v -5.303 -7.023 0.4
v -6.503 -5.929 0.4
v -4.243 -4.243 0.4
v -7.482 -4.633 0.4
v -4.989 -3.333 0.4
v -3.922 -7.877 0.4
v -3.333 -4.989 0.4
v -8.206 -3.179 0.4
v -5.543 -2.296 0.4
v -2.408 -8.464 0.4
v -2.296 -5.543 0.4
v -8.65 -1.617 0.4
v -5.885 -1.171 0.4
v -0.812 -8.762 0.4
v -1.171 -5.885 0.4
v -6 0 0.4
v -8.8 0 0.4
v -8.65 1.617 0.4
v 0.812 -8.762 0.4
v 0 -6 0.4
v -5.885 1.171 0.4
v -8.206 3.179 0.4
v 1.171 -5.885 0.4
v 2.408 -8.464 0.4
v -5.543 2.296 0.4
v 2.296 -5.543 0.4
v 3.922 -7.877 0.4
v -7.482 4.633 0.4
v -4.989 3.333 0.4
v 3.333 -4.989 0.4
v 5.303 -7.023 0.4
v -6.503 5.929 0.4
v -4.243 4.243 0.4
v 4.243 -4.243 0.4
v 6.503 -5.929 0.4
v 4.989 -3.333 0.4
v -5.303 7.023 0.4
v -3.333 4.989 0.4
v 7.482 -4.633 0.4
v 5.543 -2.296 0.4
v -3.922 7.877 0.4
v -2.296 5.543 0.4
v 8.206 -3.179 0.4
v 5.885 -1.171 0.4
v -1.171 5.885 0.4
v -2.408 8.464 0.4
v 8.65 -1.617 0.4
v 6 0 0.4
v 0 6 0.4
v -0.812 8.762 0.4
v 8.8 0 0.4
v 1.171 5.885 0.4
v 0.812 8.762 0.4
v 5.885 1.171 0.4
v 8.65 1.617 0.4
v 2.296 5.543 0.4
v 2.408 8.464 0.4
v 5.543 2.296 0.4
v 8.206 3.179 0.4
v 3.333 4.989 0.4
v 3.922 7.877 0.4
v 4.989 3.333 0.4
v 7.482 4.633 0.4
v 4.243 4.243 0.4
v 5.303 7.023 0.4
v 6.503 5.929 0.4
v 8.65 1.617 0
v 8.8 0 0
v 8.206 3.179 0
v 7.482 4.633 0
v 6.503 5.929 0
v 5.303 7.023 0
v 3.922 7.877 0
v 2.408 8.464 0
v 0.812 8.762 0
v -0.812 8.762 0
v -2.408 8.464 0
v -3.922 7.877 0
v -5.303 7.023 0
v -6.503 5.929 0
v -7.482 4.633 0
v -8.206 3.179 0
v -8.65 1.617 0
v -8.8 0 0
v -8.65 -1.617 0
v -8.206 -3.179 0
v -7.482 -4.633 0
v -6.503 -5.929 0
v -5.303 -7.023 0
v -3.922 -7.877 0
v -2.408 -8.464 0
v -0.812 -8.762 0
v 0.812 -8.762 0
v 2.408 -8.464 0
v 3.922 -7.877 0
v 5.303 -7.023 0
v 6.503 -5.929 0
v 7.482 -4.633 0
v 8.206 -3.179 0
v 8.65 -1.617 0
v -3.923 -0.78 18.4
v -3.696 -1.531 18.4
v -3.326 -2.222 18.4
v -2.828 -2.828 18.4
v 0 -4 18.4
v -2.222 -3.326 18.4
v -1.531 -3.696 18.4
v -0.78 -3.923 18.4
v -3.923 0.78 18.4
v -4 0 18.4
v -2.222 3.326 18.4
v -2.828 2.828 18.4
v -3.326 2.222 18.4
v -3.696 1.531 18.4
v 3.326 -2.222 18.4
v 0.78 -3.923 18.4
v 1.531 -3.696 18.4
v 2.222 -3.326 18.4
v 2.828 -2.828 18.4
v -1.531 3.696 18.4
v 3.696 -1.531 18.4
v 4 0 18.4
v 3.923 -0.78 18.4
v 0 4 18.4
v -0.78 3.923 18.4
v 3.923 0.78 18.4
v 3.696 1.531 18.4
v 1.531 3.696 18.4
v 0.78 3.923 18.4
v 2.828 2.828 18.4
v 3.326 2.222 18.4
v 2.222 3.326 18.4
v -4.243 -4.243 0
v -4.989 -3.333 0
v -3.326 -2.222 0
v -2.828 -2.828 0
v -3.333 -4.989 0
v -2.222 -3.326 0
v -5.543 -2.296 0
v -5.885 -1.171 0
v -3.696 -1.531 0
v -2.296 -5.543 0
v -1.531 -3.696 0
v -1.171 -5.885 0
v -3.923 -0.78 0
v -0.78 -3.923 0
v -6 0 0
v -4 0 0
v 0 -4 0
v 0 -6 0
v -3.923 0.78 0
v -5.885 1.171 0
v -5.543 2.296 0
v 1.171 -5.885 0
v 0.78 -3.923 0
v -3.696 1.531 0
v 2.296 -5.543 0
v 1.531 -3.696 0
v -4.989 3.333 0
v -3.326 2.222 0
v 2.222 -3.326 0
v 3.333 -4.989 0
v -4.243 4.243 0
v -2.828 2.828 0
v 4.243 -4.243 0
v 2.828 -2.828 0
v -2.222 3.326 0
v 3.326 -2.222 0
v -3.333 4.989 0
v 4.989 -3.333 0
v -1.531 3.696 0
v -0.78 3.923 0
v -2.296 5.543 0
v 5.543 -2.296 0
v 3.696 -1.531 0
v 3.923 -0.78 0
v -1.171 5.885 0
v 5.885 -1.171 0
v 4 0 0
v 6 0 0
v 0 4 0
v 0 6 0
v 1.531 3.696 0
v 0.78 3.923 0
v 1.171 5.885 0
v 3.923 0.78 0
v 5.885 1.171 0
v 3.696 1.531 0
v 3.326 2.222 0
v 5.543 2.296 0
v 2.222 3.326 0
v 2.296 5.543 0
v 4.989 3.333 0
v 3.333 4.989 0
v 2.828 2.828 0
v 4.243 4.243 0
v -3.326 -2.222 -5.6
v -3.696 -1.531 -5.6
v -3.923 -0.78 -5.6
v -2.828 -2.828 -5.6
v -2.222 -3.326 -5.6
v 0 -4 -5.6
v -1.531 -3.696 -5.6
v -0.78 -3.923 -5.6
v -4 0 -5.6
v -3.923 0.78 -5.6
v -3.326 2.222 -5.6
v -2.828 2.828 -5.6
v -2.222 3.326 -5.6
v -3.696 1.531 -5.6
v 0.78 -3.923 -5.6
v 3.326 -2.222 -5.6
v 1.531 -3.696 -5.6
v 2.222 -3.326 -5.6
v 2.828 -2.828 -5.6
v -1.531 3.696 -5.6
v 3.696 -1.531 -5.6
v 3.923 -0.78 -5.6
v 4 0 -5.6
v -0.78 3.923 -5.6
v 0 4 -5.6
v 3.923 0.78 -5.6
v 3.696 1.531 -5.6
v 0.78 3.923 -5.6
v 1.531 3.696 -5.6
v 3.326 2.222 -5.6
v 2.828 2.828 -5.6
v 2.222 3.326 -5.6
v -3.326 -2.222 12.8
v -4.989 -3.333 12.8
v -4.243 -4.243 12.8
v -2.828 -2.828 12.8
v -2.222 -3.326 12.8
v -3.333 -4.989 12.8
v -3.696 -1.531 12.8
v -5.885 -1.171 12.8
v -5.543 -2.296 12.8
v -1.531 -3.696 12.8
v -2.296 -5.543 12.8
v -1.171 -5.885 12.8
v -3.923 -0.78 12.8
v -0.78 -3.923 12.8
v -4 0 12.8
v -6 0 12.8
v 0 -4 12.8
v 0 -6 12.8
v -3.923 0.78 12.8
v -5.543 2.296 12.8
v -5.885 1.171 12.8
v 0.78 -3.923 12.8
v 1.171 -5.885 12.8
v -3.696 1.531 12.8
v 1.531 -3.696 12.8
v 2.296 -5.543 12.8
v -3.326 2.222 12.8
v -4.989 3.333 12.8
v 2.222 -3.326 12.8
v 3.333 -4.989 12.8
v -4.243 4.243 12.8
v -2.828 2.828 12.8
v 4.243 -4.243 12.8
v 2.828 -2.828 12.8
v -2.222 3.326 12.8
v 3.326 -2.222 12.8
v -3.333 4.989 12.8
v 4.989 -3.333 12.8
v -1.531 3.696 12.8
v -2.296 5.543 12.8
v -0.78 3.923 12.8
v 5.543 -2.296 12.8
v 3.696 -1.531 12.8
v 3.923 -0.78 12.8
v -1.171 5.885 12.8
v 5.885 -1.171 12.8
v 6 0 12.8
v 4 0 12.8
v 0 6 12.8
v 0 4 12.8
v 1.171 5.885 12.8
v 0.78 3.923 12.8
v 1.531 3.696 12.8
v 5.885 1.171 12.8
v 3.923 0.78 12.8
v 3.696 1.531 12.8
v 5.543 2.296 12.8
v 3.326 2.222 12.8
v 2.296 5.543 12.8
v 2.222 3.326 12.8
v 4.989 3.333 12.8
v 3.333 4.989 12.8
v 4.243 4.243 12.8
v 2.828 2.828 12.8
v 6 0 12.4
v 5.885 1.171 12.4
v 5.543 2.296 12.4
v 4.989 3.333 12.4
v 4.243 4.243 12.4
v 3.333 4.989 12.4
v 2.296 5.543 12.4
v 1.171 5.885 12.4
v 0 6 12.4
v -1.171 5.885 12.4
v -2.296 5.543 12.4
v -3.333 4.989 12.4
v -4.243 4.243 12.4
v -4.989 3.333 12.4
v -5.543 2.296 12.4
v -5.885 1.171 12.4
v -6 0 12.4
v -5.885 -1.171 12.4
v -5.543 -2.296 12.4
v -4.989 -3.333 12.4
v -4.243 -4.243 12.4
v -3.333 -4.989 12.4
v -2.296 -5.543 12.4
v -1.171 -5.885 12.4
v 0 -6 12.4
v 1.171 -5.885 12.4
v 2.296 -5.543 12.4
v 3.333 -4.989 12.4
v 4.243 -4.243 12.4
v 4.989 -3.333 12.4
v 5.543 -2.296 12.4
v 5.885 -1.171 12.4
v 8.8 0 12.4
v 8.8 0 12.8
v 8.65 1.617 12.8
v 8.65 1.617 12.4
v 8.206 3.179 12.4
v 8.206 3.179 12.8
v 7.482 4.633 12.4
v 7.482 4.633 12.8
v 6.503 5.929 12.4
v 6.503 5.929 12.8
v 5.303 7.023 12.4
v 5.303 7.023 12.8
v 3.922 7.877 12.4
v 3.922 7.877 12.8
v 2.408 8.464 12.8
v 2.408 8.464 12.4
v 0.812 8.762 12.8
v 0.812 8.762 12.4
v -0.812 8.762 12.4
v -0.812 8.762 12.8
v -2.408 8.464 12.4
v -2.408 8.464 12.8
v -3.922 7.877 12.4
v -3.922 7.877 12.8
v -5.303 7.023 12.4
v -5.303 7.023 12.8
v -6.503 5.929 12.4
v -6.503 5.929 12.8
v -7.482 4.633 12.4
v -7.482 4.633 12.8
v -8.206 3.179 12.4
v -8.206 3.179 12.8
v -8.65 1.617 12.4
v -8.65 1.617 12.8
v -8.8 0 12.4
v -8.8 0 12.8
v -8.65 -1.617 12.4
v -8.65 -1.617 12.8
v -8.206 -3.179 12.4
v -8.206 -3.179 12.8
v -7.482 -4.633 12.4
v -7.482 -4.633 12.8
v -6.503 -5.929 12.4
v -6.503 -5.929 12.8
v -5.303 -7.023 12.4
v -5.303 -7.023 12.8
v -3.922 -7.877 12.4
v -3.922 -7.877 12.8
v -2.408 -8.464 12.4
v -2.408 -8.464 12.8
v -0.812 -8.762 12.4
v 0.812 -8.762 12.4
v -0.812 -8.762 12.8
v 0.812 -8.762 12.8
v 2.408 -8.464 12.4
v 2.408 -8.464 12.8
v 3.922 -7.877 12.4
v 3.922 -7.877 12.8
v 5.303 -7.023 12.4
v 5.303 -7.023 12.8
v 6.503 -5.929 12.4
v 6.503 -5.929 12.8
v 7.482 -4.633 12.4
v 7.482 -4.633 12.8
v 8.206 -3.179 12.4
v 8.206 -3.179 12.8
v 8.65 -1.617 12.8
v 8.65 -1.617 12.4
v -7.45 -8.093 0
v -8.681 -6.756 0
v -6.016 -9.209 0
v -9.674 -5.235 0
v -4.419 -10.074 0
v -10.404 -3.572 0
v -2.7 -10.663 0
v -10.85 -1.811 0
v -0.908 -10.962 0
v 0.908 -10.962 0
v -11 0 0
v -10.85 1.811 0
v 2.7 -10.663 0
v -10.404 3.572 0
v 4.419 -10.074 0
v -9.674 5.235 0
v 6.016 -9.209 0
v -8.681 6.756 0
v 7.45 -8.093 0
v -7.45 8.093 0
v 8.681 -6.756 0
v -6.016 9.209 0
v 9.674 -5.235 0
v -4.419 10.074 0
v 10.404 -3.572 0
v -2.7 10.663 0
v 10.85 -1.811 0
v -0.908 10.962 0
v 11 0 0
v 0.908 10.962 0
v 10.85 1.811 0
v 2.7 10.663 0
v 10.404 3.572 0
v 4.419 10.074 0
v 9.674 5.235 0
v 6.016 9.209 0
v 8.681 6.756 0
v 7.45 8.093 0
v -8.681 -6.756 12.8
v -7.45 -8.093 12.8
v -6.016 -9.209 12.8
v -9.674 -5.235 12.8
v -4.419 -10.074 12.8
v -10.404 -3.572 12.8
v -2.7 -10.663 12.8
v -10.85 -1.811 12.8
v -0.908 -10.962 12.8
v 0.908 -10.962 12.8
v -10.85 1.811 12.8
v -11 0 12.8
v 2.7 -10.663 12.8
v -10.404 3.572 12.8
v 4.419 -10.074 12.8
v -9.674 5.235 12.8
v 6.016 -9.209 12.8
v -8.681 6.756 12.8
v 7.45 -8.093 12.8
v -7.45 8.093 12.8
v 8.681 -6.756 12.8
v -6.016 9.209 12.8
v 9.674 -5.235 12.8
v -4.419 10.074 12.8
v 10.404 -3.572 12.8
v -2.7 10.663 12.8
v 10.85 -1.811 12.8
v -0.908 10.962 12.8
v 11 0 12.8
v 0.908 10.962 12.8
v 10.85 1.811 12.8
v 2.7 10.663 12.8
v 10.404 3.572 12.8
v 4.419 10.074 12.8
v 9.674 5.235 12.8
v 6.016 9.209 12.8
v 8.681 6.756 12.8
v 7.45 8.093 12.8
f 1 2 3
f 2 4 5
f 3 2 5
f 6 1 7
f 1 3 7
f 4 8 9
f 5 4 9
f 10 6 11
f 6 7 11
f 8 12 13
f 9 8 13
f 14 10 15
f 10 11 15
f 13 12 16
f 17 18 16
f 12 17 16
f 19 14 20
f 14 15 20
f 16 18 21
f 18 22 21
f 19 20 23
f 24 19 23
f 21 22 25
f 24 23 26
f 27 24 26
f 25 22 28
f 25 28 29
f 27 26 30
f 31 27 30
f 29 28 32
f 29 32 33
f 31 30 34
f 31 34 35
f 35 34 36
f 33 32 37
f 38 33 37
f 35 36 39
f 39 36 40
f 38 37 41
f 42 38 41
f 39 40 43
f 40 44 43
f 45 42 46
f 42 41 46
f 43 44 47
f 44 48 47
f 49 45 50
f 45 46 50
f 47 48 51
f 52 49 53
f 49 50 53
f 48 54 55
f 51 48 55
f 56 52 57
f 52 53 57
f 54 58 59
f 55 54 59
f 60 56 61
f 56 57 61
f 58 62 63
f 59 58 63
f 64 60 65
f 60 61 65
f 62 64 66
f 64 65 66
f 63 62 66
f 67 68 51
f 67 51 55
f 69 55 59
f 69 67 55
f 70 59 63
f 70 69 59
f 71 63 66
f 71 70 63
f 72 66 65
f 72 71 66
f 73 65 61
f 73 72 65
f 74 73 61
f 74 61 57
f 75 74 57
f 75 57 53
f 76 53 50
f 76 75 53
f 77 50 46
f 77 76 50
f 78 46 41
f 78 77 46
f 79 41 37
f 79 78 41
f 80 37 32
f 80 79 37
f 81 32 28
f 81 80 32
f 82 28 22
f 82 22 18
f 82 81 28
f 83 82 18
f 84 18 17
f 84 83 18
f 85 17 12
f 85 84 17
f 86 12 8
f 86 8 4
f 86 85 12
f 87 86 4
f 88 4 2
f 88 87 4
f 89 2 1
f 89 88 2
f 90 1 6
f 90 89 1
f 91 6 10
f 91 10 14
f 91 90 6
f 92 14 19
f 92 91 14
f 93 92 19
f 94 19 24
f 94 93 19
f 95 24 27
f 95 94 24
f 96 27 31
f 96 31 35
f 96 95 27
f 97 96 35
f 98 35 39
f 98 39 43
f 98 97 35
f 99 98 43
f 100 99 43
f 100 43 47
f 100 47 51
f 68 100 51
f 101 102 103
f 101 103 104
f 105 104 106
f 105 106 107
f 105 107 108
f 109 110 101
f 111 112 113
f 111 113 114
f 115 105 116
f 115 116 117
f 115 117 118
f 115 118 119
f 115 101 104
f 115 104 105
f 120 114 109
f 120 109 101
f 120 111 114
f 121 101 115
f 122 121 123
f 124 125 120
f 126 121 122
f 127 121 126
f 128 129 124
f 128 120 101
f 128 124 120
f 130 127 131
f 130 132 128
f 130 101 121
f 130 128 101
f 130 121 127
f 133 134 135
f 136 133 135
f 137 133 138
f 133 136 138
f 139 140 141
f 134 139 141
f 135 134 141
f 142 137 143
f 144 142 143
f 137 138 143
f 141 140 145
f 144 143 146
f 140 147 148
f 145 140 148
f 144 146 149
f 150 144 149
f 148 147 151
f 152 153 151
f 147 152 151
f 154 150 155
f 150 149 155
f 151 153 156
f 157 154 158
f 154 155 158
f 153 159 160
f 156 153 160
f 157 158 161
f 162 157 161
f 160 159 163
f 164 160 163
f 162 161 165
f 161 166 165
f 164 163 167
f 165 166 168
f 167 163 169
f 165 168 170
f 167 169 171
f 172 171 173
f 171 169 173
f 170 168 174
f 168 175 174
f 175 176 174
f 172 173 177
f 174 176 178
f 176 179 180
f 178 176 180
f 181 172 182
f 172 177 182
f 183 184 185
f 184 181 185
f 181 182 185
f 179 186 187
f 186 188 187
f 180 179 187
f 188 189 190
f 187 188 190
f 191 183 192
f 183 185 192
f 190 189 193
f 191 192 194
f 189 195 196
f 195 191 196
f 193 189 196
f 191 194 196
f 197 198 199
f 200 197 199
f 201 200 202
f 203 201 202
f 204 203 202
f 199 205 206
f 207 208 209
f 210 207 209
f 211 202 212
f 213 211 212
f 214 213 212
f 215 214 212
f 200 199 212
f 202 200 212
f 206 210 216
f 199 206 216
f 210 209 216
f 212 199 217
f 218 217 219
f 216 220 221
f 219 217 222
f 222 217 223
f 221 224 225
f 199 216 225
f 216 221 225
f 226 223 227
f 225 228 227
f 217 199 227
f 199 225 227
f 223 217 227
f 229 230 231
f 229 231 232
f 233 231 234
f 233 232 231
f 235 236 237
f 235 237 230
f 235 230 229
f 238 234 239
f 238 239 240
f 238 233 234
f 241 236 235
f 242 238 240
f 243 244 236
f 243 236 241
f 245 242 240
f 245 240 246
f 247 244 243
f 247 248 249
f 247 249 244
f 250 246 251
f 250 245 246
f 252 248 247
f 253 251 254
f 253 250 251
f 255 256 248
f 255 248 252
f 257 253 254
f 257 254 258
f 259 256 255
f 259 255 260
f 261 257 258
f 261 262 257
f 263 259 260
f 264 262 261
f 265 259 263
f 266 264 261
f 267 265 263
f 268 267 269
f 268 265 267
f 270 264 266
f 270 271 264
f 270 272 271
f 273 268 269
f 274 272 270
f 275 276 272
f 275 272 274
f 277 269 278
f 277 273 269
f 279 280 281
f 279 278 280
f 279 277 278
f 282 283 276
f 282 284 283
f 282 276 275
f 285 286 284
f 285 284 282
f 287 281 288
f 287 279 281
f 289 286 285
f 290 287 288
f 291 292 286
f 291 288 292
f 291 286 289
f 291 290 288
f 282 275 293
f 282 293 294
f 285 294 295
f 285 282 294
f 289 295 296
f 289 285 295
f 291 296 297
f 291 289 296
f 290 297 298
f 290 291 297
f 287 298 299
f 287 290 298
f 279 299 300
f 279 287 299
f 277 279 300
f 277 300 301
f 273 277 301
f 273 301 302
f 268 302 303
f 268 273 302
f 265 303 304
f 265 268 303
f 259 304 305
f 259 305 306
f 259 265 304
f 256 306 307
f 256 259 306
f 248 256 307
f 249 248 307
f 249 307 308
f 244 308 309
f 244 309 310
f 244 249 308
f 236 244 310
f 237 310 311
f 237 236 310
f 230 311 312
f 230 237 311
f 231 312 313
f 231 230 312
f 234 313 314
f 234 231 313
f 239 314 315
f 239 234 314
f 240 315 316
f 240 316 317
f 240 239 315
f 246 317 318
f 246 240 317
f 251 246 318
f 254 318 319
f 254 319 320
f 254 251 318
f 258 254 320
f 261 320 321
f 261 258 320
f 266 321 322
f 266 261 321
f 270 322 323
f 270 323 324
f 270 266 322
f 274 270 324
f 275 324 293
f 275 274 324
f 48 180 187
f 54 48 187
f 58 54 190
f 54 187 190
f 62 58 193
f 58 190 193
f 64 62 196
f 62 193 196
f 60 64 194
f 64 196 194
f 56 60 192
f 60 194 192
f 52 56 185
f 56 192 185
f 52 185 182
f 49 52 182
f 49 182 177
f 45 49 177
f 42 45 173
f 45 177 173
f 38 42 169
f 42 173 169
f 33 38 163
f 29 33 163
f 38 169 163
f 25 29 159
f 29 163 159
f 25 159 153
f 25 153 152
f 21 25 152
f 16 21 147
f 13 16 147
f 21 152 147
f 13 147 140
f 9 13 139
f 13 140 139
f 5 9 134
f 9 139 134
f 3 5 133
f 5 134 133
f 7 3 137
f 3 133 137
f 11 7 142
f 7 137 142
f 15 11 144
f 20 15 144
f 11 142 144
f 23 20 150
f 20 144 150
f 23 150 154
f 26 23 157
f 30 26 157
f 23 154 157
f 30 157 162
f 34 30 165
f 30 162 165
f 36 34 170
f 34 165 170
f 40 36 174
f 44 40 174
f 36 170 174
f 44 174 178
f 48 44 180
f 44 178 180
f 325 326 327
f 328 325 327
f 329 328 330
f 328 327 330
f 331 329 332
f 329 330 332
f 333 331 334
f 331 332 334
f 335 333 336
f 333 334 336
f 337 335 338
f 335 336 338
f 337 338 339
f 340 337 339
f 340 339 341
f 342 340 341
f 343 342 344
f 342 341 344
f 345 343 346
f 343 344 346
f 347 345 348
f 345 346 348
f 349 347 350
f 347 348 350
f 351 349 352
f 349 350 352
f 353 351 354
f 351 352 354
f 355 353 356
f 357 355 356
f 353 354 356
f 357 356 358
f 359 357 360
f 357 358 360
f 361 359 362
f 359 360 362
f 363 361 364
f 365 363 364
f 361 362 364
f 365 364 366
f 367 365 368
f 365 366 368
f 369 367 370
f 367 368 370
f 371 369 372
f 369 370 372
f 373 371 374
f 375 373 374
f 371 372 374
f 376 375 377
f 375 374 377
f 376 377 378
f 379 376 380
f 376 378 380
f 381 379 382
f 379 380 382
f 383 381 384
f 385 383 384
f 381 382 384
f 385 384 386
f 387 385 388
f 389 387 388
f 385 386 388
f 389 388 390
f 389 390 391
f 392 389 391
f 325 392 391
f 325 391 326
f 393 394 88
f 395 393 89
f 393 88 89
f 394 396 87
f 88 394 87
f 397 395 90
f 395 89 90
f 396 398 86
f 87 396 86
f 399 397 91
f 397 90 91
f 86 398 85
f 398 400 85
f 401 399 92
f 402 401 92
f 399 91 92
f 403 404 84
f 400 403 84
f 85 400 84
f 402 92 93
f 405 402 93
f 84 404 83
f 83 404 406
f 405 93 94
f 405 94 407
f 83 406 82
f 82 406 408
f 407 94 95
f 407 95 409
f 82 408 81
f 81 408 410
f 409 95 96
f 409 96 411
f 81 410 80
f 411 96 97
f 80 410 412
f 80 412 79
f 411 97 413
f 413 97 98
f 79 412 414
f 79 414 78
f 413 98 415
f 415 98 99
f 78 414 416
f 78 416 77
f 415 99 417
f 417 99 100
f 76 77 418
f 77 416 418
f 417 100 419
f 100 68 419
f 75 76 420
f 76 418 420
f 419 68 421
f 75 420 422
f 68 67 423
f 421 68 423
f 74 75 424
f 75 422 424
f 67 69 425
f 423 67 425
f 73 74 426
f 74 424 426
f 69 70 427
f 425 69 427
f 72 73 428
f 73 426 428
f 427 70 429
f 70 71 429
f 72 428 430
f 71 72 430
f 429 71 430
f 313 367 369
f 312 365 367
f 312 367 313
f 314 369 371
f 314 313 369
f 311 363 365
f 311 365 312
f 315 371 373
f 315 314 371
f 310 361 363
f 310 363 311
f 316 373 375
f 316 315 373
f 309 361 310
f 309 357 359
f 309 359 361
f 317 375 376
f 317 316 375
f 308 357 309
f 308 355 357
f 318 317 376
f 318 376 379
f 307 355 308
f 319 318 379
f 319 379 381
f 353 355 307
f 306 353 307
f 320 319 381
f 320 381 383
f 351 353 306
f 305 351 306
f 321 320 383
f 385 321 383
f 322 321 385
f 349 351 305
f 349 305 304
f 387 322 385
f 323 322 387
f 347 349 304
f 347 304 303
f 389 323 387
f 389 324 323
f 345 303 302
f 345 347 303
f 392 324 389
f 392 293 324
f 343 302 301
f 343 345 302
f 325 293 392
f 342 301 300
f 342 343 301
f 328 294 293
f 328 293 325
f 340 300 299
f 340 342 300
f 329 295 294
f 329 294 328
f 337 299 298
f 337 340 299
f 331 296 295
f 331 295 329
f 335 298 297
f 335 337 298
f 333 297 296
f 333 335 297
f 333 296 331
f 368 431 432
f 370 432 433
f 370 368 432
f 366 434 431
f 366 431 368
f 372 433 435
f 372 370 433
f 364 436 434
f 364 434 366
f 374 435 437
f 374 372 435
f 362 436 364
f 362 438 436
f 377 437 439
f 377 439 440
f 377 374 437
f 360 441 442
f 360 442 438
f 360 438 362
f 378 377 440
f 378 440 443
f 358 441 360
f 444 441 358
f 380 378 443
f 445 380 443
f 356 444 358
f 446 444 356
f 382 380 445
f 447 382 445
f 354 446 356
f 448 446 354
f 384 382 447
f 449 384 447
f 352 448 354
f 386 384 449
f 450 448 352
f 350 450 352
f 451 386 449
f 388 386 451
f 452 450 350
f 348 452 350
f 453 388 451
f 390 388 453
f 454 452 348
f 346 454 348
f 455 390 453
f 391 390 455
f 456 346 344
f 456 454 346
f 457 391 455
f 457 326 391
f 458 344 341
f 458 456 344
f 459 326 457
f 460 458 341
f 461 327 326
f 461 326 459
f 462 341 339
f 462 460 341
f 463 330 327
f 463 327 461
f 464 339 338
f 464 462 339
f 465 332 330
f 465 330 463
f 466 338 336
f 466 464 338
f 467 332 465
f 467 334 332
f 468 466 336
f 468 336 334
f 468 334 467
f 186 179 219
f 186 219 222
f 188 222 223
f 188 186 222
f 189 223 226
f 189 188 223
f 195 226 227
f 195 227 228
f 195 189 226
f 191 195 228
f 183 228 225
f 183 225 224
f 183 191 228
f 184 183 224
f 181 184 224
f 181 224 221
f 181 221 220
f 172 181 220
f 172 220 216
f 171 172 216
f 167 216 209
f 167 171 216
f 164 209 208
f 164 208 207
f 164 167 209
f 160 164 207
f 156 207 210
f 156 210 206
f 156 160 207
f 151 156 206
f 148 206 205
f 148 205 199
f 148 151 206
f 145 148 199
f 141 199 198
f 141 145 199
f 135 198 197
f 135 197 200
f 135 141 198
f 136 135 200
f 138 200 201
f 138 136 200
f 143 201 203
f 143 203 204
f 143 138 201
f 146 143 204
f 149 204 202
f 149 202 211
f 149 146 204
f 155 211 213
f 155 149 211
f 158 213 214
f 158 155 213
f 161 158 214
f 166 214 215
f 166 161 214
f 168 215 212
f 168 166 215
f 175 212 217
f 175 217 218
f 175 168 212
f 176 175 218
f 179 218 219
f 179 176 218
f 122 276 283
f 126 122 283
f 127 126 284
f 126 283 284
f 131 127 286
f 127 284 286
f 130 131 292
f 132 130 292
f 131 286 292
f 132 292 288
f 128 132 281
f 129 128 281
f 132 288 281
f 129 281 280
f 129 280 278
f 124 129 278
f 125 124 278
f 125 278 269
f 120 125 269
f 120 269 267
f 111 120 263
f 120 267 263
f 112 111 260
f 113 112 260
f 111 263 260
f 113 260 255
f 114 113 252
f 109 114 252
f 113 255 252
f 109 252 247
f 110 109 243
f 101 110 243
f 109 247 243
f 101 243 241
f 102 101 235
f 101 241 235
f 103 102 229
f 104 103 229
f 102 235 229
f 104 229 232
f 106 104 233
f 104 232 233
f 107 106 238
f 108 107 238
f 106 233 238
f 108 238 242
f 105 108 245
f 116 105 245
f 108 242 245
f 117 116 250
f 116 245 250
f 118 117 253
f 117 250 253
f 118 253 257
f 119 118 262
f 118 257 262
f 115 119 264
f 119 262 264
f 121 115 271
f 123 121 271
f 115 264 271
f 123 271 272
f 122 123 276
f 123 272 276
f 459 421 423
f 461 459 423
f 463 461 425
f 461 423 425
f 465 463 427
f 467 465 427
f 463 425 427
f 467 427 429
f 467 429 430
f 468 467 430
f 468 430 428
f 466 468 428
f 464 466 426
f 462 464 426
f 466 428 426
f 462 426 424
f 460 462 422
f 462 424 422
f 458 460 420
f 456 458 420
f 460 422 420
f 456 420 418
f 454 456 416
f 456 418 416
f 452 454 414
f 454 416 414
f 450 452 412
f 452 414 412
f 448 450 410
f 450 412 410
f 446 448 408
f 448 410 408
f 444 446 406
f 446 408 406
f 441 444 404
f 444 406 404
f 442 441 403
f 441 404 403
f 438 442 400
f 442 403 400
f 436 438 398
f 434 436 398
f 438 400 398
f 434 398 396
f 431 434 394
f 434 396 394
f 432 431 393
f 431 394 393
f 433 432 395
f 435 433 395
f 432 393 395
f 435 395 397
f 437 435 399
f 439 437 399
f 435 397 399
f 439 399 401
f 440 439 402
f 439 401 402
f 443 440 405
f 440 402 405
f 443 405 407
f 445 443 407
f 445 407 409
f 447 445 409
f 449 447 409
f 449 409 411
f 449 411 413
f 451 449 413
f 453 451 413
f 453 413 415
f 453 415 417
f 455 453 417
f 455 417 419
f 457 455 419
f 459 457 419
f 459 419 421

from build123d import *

# Parameters (mm, degrees)
CROQUIS1_R              = 11
SALIENTE_EXTRUIR1_DEPTH = 12.8
CROQUIS2_R              = 8.8
CROQUIS2_R_2            = 6
CORTAR_EXTRUIR1_DEPTH   = 0.4
CROQUIS3_R              = 4
SALIENTE_EXTRUIR2_DEPTH = 5.6


with BuildPart() as part:
    # Croquis1 → Saliente-Extruir1 (new body)
    with BuildSketch(Plane.XY):
        Circle(CROQUIS1_R)
    extrude(amount=SALIENTE_EXTRUIR1_DEPTH)

    # Croquis2 → Cortar-Extruir1 (cut)
    with BuildSketch(Plane.XY.offset(12.8)):
        Circle(CROQUIS2_R)
        Circle(CROQUIS2_R_2, mode=Mode.SUBTRACT)
    cortar_extruir1 = extrude(amount=-CORTAR_EXTRUIR1_DEPTH, mode=Mode.SUBTRACT)

    # Croquis3 → Saliente-Extruir2 (add)
    with BuildSketch(Plane.XY.offset(12.8)):
        Circle(CROQUIS3_R)
    saliente_extruir2 = extrude(amount=SALIENTE_EXTRUIR2_DEPTH)

    # Simetría1: Cortar-Extruir1, Saliente-Extruir2 across plane
    add(cortar_extruir1.mirror(Plane.XY.offset(6.4)), mode=Mode.SUBTRACT)
    add(saliente_extruir2.mirror(Plane.XY.offset(6.4)))


solid = part.part
